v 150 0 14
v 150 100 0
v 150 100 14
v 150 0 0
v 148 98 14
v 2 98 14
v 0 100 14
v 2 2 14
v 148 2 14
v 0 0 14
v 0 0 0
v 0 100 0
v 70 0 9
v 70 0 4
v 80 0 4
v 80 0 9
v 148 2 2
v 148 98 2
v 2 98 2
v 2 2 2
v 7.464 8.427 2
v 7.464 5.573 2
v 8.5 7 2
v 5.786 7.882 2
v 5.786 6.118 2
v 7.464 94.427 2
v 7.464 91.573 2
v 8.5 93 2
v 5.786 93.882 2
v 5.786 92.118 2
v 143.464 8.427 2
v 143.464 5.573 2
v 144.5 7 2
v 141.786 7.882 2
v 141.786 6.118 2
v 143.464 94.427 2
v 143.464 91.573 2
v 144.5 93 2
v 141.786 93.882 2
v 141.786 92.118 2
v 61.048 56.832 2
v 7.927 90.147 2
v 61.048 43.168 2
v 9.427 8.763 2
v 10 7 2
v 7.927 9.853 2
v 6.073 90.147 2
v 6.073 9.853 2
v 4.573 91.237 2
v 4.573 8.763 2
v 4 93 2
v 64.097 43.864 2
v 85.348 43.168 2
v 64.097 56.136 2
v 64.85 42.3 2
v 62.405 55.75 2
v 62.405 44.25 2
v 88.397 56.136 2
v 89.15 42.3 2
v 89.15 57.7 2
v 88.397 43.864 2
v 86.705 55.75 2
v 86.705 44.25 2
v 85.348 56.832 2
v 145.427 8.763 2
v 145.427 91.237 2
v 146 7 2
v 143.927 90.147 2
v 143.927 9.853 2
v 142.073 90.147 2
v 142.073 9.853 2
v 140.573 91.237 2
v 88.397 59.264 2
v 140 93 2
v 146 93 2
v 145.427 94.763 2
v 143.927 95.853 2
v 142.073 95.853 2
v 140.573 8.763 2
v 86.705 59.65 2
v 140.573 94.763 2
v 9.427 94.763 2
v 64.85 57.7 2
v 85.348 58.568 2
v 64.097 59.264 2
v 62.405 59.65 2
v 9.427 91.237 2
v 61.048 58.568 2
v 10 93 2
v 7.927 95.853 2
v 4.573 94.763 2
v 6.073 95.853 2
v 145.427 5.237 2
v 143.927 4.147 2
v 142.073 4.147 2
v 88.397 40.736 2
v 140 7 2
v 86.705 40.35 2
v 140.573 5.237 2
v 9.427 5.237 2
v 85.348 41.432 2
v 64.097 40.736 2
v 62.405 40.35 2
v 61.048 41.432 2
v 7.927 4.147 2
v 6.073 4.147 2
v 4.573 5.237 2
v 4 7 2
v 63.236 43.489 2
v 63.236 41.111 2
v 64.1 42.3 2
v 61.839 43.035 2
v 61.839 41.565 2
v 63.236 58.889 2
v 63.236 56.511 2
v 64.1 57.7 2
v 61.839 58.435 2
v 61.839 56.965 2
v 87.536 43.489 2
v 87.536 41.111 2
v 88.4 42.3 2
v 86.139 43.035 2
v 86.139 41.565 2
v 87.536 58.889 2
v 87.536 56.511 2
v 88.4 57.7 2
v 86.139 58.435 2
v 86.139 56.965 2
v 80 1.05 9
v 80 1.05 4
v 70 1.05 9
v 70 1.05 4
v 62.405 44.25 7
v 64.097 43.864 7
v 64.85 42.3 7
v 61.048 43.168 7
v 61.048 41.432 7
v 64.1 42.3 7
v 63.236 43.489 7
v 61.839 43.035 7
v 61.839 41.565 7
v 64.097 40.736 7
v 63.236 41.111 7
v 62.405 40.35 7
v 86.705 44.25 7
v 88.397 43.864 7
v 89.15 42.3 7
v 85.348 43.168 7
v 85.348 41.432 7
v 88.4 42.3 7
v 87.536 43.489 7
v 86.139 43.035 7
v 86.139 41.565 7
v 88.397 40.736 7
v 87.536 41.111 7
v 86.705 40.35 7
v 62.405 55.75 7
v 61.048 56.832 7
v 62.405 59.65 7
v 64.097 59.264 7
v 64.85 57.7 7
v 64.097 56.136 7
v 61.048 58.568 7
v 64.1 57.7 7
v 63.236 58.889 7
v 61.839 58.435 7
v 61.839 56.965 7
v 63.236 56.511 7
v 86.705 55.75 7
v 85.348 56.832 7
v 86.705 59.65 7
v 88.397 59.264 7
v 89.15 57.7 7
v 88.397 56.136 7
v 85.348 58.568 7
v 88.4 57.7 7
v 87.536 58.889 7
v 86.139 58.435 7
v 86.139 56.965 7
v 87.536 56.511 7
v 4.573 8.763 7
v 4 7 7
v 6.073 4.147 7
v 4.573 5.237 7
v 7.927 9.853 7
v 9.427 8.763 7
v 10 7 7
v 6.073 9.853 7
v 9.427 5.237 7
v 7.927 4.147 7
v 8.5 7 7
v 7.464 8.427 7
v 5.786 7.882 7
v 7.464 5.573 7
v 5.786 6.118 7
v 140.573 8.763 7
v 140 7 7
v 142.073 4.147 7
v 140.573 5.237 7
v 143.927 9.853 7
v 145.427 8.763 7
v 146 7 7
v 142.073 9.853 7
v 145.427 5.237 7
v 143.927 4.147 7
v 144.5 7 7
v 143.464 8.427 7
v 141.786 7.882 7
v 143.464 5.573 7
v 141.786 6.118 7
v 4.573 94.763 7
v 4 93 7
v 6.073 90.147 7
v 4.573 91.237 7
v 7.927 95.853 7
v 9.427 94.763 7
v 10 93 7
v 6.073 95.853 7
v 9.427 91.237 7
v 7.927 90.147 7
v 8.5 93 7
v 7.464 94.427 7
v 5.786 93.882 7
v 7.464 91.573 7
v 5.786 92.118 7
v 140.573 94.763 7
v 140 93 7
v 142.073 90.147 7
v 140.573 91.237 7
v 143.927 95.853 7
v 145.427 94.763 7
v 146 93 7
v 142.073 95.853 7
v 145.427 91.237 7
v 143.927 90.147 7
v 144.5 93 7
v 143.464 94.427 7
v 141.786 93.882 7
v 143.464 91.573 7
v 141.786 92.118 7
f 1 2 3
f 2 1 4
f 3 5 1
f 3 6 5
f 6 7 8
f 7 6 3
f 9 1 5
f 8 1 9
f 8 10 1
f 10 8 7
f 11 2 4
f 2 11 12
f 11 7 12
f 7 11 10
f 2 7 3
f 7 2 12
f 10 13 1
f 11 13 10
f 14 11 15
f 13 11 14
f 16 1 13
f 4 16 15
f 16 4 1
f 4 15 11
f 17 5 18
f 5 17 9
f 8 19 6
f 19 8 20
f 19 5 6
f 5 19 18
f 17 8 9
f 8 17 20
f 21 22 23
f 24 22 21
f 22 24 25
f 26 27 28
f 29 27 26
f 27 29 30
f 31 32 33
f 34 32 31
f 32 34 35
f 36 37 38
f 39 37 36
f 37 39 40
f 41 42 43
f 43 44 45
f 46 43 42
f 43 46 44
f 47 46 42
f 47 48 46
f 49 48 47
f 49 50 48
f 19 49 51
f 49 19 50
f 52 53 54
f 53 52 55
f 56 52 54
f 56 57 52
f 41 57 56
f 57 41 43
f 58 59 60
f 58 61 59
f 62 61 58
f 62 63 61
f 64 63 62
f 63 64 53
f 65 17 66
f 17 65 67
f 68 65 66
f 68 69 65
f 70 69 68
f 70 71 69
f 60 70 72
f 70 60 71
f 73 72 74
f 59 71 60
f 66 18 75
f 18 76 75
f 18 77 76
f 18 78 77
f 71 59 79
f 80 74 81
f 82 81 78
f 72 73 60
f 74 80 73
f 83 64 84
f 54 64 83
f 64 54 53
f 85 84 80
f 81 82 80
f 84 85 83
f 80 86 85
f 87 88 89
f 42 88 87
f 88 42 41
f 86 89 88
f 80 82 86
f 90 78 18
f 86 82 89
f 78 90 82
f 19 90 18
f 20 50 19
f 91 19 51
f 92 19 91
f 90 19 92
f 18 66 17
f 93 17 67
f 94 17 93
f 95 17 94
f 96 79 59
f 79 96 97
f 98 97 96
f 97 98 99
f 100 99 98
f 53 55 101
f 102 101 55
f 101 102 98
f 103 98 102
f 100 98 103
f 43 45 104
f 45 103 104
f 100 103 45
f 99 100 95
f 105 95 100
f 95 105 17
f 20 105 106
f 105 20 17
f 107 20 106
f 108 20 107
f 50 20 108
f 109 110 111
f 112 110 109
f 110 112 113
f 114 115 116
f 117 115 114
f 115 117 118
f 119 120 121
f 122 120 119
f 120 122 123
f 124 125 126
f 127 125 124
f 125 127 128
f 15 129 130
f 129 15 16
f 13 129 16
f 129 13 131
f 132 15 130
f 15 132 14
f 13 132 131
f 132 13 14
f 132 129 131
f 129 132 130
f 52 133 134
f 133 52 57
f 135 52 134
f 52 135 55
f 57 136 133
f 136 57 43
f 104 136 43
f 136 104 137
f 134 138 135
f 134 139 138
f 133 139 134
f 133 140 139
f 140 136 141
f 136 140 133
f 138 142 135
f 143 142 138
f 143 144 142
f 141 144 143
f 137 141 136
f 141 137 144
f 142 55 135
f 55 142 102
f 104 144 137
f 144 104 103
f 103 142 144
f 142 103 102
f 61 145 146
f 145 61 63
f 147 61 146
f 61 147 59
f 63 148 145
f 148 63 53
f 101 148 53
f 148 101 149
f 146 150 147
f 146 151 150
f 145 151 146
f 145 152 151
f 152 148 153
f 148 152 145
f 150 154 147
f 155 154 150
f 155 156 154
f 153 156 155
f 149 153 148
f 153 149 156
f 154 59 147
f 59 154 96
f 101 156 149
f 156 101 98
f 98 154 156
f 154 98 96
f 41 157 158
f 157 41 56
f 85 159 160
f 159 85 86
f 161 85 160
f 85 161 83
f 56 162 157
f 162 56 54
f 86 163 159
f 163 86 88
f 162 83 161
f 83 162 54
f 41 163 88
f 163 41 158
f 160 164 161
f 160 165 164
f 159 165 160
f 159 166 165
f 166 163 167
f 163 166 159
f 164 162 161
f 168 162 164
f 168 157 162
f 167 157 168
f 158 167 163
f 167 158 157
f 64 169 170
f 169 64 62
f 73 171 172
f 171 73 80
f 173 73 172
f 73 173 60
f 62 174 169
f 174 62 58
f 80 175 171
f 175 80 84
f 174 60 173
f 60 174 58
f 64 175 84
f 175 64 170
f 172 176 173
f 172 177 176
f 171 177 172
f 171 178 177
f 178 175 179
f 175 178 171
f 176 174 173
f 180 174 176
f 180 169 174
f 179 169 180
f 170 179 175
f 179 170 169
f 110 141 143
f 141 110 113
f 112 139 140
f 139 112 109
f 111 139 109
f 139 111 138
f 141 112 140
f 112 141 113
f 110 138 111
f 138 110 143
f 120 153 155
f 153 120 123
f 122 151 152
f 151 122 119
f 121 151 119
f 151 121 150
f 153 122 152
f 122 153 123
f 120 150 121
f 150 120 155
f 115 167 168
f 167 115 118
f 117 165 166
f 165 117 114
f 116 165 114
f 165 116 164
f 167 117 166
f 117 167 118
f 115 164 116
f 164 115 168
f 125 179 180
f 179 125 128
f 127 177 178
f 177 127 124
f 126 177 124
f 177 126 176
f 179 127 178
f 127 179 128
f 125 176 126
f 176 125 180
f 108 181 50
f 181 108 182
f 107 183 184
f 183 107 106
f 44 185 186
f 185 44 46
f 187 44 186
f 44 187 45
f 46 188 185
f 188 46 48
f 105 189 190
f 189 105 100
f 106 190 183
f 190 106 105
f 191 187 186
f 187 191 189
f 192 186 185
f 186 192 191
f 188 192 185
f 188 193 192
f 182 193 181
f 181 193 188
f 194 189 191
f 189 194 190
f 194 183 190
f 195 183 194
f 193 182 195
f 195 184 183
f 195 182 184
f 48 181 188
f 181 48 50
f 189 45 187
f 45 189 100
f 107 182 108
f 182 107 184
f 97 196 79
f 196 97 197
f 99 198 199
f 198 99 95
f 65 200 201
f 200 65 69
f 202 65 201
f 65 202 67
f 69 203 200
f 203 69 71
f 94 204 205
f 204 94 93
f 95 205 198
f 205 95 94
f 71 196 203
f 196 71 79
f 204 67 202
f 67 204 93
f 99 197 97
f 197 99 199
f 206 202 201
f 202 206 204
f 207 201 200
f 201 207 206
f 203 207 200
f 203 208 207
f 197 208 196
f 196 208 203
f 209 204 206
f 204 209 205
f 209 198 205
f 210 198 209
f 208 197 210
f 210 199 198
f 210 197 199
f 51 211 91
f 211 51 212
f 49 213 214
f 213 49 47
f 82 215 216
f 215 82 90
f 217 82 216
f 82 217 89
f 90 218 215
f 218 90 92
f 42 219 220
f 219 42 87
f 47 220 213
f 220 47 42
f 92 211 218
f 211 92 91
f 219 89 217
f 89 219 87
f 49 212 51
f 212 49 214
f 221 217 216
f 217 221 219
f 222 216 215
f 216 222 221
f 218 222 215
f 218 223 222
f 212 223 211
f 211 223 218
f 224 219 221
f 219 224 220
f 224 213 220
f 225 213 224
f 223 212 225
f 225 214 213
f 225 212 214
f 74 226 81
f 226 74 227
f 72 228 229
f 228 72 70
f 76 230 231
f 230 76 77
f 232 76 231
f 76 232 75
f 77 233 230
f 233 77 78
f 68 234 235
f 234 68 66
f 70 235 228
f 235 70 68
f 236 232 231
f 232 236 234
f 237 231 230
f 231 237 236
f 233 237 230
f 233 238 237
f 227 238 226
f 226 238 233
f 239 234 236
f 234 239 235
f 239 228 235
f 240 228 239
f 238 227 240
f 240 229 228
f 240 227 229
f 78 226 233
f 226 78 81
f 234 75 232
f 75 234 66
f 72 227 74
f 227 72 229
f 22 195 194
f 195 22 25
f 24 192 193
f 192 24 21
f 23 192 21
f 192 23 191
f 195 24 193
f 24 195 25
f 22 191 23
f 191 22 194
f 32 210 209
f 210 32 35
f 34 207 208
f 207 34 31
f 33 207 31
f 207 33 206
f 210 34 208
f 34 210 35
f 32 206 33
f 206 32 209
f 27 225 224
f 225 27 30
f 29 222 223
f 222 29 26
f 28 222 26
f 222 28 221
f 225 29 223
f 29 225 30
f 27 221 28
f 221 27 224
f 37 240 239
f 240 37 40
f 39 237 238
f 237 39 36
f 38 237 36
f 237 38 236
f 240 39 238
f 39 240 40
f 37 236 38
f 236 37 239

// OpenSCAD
union() {
	difference() {
		union() {
			cube(size = [150, 100, 2]);
			difference() {
				cube(size = [150, 100, 14.0000000000]);
				translate(v = [2, 2, 0]) {
					cube(size = [146, 96, 14.0000000000]);
				}
			}
		}
		translate(v = [75.0000000000, 0, 6.5000000000]) {
			cube(center = true, size = [10, 2.1000000000, 5]);
		}
	}
	difference() {
		union() {
			translate(v = [62.8500000000, 42.3000000000, 2]) {
				cylinder(d = 4, h = 5);
			}
			translate(v = [87.1500000000, 42.3000000000, 2]) {
				cylinder(d = 4, h = 5);
			}
			translate(v = [62.8500000000, 57.7000000000, 2]) {
				cylinder(d = 4, h = 5);
			}
			translate(v = [87.1500000000, 57.7000000000, 2]) {
				cylinder(d = 4, h = 5);
			}
		}
		union() {
			translate(v = [62.8500000000, 42.3000000000, 2]) {
				cylinder(d = 2.5000000000, h = 5.1000000000);
			}
			translate(v = [87.1500000000, 42.3000000000, 2]) {
				cylinder(d = 2.5000000000, h = 5.1000000000);
			}
			translate(v = [62.8500000000, 57.7000000000, 2]) {
				cylinder(d = 2.5000000000, h = 5.1000000000);
			}
			translate(v = [87.1500000000, 57.7000000000, 2]) {
				cylinder(d = 2.5000000000, h = 5.1000000000);
			}
		}
	}
	difference() {
		union() {
			translate(v = [7, 7, 2]) {
				cylinder(d = 6, h = 5);
			}
			translate(v = [143, 7, 2]) {
				cylinder(d = 6, h = 5);
			}
			translate(v = [7, 93, 2]) {
				cylinder(d = 6, h = 5);
			}
			translate(v = [143, 93, 2]) {
				cylinder(d = 6, h = 5);
			}
		}
		union() {
			translate(v = [7, 7, 2]) {
				cylinder(d = 3, h = 10);
			}
			translate(v = [143, 7, 2]) {
				cylinder(d = 3, h = 10);
			}
			translate(v = [7, 93, 2]) {
				cylinder(d = 3, h = 10);
			}
			translate(v = [143, 93, 2]) {
				cylinder(d = 3, h = 10);
			}
		}
	}
}
